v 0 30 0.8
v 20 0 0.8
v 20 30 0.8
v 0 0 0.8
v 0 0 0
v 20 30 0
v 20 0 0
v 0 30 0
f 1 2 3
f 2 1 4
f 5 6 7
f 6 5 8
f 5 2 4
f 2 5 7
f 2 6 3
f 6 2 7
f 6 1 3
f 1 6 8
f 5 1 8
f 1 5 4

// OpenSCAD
h=200;
$fn=64;

cube([20,30,0.8]);

// rotate_extrude(convexity = 10, angle = 180, $fn=$fn) projection(cut=false) translate([-115/2,0,0]) rotate([0,0,90]) shape();

// shape();

module shape() {
difference() {
  union() {
    translate([0,0,0]) cube([27.4,16.2,h]);
    translate([8.5,14,0]) cube([10.4,32.2,h]);
    translate([13.7,32.2+14,0]) cylinder(r=5.2,h=h);
  }
  translate([1.2,0,-0.1]) negative();
}
}

module negative() {
  translate([2,-0.1,0]) cube([21,2.1,h+0.2]);
  translate([0,1.2,0]) cube([25,13.8,h+0.2]);
  translate([8.5,14.9,0]) cube([8,31.1,h+0.2]);
  translate([12.5,31.1+14.9,0]) cylinder(r=4,h=h+0.2);
}
